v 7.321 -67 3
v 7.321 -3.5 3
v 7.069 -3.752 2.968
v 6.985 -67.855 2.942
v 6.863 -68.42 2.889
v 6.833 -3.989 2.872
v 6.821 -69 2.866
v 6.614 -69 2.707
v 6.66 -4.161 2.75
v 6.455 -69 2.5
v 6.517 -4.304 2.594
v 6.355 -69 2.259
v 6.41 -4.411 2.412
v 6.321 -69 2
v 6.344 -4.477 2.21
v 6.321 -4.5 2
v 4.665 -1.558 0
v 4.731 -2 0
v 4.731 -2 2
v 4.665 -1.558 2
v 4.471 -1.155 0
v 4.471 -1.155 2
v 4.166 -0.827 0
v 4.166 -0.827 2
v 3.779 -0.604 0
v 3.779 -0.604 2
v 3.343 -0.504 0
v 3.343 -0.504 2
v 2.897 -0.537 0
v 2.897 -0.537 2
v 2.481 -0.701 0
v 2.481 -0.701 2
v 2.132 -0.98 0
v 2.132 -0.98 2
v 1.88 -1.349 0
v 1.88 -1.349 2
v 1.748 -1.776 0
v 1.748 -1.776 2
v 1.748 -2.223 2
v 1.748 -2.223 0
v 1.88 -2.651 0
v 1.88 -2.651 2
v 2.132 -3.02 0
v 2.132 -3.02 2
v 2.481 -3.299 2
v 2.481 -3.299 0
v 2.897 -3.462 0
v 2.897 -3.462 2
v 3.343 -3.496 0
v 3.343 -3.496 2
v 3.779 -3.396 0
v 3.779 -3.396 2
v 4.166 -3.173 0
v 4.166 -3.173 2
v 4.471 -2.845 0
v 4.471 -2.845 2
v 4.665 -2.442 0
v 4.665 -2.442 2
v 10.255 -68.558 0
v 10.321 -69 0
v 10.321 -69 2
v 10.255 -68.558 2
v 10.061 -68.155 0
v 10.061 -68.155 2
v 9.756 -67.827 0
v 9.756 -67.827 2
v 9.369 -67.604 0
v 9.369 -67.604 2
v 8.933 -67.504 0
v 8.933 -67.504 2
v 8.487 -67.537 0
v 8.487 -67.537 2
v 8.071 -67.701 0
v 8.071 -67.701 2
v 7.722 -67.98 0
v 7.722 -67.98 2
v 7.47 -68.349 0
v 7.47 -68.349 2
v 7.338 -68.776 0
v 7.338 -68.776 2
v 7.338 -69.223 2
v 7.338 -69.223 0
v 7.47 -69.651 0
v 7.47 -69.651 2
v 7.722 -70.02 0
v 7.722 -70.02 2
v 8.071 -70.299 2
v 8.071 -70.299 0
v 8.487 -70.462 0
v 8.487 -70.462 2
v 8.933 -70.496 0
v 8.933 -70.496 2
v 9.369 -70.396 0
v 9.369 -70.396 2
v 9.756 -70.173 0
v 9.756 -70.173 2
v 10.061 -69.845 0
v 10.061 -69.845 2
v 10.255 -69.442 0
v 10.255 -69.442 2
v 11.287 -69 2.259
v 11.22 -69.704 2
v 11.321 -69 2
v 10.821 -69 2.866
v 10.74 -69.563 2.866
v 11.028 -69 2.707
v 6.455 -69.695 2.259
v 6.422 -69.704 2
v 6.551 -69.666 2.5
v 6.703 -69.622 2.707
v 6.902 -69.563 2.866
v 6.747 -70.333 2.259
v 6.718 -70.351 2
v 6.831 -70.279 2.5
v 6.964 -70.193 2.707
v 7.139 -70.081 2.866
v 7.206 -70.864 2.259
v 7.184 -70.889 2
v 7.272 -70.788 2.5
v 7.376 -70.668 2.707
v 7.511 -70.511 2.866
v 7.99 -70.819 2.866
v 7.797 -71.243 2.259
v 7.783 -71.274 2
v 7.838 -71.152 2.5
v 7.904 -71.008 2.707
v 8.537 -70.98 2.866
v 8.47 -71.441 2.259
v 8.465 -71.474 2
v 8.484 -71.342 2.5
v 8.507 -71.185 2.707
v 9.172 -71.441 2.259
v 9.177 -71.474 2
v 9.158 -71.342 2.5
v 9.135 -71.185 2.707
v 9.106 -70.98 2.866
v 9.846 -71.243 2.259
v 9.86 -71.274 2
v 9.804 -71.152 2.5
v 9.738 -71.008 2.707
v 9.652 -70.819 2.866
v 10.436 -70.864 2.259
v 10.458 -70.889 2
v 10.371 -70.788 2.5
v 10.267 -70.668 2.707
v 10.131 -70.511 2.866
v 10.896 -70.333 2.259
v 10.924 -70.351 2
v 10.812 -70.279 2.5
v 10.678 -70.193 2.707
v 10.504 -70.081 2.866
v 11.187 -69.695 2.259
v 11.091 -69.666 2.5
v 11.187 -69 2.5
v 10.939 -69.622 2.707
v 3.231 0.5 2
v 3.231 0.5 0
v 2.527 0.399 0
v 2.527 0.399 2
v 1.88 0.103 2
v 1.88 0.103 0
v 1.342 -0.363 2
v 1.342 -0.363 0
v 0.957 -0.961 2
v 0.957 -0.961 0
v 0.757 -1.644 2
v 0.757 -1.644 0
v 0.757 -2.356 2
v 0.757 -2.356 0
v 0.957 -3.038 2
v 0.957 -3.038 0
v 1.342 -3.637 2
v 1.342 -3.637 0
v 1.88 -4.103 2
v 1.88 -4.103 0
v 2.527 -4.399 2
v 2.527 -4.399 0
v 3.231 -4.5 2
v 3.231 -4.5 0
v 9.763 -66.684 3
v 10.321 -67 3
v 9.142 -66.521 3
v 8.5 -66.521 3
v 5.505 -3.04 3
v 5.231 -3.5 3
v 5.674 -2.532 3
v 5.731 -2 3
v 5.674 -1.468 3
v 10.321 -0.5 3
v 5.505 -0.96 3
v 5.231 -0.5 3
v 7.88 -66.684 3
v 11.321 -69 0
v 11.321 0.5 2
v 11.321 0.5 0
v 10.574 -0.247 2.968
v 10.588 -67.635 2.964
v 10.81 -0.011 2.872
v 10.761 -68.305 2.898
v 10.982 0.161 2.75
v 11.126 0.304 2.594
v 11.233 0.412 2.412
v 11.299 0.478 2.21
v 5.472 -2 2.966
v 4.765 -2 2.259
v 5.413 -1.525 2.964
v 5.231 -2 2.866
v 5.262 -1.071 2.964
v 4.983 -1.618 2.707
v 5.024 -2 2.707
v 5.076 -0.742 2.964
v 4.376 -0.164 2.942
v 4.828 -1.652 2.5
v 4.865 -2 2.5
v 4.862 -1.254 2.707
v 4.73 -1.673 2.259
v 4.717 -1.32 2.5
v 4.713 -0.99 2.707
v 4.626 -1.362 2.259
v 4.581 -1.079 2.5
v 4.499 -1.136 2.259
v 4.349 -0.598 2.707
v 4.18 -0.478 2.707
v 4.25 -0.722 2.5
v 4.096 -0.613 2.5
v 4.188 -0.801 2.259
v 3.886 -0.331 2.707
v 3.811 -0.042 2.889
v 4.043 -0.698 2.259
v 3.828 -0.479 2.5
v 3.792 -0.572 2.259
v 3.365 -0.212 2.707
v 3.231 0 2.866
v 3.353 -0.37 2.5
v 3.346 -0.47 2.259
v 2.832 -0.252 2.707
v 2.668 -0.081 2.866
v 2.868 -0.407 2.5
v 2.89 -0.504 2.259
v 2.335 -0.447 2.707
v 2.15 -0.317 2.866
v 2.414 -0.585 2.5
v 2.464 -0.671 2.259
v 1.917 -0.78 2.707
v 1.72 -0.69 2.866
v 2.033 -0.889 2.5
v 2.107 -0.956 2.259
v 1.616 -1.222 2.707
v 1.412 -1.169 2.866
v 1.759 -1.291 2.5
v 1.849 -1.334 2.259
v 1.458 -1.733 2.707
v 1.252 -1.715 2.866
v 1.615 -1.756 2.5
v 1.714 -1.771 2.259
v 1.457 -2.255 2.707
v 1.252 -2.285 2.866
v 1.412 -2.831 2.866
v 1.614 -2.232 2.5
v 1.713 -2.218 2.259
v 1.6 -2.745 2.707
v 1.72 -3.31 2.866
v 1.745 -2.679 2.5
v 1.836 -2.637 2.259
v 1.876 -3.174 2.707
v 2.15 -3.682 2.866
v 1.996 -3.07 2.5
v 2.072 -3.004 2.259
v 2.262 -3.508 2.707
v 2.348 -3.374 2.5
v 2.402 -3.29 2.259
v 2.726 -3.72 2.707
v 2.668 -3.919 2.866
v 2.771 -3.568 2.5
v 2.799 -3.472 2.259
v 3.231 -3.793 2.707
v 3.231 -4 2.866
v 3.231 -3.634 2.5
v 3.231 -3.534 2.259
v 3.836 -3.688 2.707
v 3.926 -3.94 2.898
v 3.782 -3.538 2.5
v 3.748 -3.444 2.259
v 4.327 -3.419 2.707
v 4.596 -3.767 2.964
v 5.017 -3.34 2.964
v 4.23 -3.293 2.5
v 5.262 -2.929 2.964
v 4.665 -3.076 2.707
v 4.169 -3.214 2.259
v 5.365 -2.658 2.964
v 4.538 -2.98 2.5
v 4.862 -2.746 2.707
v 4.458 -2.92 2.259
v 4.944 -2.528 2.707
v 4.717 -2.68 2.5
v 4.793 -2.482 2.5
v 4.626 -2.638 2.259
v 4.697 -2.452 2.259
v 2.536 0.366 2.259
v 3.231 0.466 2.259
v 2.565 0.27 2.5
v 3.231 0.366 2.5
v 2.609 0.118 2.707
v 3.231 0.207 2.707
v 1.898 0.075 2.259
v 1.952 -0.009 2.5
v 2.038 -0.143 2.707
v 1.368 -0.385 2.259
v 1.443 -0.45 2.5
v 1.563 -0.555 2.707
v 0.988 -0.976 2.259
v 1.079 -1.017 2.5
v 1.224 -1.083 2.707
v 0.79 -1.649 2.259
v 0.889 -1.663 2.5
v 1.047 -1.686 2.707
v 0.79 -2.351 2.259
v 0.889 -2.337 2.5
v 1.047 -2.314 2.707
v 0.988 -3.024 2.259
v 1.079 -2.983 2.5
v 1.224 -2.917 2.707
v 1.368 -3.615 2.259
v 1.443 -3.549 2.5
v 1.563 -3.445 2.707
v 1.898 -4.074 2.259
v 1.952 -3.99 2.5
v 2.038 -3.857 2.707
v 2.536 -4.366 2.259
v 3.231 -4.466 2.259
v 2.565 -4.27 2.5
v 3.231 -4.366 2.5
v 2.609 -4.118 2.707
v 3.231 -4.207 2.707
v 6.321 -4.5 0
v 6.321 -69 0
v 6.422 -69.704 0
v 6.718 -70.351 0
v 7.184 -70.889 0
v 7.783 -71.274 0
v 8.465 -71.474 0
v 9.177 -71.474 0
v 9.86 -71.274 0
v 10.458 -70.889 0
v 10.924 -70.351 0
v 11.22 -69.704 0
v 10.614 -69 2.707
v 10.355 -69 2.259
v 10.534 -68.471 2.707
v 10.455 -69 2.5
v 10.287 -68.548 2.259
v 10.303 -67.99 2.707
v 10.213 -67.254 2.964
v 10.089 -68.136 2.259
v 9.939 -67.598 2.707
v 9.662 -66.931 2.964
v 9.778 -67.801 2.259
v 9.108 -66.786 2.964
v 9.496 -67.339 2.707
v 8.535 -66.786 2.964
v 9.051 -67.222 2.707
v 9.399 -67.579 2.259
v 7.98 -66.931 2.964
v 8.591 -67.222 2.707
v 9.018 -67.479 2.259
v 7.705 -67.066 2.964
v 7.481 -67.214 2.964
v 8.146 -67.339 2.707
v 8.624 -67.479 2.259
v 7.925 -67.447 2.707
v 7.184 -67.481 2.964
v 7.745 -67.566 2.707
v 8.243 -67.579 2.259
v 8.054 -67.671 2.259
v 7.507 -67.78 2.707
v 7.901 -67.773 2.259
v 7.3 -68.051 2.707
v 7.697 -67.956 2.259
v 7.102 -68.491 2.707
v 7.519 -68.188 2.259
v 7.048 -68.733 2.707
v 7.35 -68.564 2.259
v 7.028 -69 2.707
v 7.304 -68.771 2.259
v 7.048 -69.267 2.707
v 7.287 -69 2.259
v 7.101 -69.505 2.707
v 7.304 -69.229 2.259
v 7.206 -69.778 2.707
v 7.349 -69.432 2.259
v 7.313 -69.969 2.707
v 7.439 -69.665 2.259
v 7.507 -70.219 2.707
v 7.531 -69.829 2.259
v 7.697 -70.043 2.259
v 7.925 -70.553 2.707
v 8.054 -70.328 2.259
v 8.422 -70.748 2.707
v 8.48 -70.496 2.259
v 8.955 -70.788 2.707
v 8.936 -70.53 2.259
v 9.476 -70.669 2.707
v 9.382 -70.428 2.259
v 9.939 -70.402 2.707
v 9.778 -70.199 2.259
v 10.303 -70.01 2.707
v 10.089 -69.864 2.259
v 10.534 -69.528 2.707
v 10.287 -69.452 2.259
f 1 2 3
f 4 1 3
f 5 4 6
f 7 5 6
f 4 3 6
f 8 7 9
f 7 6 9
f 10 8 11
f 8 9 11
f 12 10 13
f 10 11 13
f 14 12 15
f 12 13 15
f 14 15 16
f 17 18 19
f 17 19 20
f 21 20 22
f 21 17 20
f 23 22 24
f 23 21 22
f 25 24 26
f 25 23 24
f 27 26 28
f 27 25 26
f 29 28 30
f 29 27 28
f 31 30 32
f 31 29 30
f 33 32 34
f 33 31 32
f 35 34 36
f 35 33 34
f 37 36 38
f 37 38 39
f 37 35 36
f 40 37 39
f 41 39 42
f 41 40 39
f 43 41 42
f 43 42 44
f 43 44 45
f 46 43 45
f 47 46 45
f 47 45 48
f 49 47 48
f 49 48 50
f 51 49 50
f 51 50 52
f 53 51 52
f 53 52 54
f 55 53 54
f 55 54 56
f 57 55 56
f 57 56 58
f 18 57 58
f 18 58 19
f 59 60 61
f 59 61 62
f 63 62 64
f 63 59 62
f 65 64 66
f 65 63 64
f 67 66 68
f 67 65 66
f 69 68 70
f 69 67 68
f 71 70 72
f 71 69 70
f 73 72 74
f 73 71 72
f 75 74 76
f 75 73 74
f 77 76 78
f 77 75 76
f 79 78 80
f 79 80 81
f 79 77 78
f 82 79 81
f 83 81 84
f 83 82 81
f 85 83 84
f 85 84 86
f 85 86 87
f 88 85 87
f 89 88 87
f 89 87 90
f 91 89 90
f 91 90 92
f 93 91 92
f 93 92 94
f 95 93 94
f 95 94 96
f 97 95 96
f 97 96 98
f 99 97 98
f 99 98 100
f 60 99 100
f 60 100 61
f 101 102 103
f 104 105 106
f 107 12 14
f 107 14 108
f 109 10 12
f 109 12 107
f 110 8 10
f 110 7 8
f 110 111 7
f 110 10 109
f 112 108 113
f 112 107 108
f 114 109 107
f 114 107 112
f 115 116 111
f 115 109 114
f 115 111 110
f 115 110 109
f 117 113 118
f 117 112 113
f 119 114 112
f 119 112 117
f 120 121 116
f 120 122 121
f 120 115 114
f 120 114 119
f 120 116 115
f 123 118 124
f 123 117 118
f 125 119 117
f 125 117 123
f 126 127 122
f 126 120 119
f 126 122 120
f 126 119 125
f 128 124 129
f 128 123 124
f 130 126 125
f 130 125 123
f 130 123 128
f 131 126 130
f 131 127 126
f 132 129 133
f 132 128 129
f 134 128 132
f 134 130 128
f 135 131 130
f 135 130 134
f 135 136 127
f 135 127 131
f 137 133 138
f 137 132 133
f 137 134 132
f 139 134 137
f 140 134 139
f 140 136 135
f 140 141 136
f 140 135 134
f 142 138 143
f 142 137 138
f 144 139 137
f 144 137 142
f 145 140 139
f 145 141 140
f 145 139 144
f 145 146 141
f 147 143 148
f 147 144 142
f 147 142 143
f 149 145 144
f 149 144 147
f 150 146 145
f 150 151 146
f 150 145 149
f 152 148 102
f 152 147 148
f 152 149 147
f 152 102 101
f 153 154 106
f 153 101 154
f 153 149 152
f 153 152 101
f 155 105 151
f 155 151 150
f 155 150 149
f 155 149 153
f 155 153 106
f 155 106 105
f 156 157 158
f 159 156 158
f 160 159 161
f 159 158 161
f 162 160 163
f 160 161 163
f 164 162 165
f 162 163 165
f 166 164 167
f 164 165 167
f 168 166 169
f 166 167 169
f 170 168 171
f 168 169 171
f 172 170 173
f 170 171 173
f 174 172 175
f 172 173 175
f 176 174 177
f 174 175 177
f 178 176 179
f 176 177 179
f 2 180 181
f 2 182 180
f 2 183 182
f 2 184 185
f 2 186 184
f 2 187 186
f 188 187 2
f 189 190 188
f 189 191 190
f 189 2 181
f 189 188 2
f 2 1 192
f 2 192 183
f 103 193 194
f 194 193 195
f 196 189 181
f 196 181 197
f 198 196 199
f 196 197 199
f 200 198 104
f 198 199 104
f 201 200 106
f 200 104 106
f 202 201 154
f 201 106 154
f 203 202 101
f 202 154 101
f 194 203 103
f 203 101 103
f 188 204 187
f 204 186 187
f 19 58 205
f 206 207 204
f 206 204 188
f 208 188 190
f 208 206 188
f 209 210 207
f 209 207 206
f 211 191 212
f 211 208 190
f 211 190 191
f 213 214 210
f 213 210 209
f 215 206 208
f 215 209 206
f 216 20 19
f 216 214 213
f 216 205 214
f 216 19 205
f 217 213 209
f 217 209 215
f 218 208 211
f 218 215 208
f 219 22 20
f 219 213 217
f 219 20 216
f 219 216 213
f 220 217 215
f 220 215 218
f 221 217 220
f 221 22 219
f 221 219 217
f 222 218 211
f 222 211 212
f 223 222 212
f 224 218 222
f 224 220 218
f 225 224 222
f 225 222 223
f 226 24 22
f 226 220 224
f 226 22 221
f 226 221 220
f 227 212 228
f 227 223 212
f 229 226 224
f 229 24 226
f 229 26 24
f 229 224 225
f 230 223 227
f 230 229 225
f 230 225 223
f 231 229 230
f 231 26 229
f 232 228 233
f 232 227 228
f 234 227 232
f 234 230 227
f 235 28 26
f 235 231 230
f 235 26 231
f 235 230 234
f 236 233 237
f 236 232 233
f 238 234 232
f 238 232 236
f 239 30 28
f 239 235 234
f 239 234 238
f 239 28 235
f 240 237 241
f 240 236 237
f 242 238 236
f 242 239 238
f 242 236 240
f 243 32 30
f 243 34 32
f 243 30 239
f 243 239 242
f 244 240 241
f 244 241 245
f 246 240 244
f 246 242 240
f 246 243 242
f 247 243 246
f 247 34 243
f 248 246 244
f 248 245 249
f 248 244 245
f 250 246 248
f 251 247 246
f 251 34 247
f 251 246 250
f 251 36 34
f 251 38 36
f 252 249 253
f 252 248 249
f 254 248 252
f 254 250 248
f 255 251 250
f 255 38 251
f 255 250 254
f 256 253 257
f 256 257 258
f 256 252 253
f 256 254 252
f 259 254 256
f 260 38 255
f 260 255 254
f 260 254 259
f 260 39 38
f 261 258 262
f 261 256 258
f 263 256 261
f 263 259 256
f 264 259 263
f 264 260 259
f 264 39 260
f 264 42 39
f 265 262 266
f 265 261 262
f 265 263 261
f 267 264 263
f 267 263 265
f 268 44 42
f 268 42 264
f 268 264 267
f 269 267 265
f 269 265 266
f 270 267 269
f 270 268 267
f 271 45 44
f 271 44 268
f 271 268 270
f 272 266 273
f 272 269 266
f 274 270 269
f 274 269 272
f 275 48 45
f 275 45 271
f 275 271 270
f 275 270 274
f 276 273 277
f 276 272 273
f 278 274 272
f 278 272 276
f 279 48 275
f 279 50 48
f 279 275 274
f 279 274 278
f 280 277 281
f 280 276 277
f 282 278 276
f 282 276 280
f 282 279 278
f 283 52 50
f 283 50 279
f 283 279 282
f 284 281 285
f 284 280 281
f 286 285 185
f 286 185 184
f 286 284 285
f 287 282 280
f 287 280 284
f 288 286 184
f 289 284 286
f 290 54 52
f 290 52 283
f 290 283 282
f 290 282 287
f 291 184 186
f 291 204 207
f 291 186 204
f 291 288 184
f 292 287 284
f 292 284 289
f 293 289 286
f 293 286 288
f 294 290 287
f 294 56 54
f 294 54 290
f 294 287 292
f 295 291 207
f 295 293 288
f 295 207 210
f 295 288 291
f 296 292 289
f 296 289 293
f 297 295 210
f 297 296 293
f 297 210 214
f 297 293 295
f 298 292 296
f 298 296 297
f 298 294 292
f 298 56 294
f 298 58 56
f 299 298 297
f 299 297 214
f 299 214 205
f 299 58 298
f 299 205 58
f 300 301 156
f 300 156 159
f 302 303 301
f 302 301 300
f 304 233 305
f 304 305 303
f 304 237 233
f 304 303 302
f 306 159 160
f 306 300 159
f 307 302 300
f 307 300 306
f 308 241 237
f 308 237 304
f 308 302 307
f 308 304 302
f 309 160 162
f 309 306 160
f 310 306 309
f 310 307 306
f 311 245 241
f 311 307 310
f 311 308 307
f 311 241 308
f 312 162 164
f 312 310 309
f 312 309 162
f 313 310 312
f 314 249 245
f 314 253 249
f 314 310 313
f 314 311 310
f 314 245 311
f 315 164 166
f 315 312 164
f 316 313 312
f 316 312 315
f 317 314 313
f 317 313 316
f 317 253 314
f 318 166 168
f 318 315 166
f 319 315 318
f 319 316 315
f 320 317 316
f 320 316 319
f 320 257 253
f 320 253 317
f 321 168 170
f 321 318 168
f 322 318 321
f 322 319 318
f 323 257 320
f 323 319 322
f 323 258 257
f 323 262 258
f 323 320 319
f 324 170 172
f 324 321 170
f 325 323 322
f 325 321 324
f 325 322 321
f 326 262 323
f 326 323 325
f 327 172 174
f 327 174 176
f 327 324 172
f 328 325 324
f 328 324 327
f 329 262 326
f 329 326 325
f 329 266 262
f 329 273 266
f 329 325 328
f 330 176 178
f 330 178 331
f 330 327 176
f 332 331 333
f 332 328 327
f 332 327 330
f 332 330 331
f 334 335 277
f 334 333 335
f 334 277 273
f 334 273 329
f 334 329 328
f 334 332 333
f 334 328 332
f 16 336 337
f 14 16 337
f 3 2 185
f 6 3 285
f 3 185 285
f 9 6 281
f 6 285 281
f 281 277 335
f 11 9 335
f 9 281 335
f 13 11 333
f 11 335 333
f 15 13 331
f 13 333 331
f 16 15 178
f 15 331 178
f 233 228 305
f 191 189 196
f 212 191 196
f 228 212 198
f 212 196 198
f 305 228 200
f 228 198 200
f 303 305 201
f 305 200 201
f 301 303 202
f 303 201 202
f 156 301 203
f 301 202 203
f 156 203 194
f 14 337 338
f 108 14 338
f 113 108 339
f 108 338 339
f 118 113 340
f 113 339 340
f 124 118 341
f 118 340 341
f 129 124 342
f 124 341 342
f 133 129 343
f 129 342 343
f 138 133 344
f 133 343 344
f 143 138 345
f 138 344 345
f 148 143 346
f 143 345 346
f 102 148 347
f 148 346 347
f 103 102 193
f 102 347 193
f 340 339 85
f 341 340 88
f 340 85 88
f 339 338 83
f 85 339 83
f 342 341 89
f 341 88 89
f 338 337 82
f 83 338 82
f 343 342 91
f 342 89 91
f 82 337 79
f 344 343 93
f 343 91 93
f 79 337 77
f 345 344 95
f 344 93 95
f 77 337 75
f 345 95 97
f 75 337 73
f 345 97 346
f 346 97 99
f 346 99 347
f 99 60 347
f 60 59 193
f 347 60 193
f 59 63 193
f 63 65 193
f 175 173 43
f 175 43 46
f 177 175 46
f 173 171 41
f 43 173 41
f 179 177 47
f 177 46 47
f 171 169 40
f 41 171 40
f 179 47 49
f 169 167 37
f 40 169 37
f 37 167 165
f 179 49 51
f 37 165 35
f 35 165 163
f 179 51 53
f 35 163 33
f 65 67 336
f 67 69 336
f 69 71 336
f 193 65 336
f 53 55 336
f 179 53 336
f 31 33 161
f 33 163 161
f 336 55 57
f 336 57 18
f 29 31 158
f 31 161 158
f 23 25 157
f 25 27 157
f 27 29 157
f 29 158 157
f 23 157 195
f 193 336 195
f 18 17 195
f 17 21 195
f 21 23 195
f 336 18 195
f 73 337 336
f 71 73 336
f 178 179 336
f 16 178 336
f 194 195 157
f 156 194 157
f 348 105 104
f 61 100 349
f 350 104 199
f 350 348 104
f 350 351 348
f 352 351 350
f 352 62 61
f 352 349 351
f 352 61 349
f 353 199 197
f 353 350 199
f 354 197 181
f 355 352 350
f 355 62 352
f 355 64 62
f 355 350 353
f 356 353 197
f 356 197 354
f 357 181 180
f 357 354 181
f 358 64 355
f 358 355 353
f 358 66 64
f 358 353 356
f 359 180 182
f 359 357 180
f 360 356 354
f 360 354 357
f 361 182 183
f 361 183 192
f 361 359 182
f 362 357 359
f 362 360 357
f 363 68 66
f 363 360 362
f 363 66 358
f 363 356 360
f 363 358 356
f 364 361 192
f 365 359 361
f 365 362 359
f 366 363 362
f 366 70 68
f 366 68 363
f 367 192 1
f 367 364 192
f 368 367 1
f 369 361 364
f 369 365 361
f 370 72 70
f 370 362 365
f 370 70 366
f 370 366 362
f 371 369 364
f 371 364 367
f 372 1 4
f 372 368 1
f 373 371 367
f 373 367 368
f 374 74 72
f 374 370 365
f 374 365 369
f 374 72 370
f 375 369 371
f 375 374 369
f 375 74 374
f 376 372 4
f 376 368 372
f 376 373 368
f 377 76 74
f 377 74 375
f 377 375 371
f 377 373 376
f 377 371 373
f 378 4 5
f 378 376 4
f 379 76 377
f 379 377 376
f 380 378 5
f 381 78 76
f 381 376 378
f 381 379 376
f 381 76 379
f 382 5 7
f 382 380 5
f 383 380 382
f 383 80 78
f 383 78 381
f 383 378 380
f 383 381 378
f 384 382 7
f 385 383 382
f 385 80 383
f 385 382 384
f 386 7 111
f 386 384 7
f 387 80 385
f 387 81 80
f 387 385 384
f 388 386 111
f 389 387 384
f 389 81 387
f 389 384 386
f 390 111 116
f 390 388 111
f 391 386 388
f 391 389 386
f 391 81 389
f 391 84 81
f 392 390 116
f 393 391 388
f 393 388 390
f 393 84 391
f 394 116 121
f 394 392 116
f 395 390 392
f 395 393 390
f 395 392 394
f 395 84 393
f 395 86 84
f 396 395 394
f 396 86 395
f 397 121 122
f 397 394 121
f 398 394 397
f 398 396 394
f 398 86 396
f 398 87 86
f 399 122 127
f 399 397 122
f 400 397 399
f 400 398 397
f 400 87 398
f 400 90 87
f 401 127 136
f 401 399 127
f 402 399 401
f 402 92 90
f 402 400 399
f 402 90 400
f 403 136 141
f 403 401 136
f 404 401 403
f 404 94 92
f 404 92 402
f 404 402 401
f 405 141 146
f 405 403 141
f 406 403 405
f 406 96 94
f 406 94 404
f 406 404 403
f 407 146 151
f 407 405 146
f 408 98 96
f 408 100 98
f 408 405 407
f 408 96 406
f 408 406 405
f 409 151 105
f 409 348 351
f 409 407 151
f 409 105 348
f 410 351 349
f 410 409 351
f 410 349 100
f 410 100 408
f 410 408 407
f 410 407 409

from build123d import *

# Parameters (mm, degrees)
SKETCH1_R           = 1.5
BOSS_EXTRUDE1_DEPTH = 3
FILLET1_R           = 1


with BuildPart() as part:
    # Sketch1 → Boss-Extrude1 (new body)
    with BuildSketch(Plane.XY):
        with BuildLine():
            Line((3.231167374, -4.499889348), (6.321167374, -4.499889348))
            Line((6.321167374, -4.499889348), (6.321167374, -68.999889348))
            ThreePointArc((6.321167374, -68.999889348), (8.821167374, -71.499889348), (11.321167374, -68.999889348))
            Line((11.321167374, -68.999889348), (11.321167374, 0.500110652))
            Line((11.321167374, 0.500110652), (3.231167374, 0.500110652))
            ThreePointArc((3.231167374, 0.500110652), (0.731167374, -1.999889348), (3.231167374, -4.499889348))
        make_face()
        with Locations((3.231167374, -1.999889348)):
            Circle(SKETCH1_R, mode=Mode.SUBTRACT)
        with Locations((8.821167374, -68.999889348)):
            Circle(SKETCH1_R, mode=Mode.SUBTRACT)
    extrude(amount=BOSS_EXTRUDE1_DEPTH)

    # Fillet1
    # the kernel refuses this fillet: 1 mm, written as the material it takes off along each edge
    with BuildSketch(Plane(origin=(8.821167374, -68.999889348, 3), x_dir=(1, 0, 0), z_dir=(0, -1, 0))) as fillet1_piece_1:
        with BuildLine():
            CenterArc((1.5 + FILLET1_R, -FILLET1_R), FILLET1_R, 90, 90)
            Line((1.5 + FILLET1_R, 0), (1.5, 0))
            Line((1.5, 0), (1.5, -FILLET1_R))
        make_face()
    revolve(axis=Axis((8.821167374, -68.999889348, 3), (0, 0, 1)), mode=Mode.SUBTRACT)
    with BuildSketch(Plane(origin=(3.231167374, -1.999889348, 3), x_dir=(1, 0, 0), z_dir=(0, -1, 0))) as fillet1_piece_2:
        with BuildLine():
            CenterArc((1.5 + FILLET1_R, -FILLET1_R), FILLET1_R, 90, 90)
            Line((1.5 + FILLET1_R, 0), (1.5, 0))
            Line((1.5, 0), (1.5, -FILLET1_R))
        make_face()
    revolve(axis=Axis((3.231167374, -1.999889348, 3), (0, 0, 1)), mode=Mode.SUBTRACT)
    with BuildSketch(Plane(origin=(13.821167374, 0.500110652, 3), x_dir=(0, 0, -1), z_dir=(-1, 0, 0))) as fillet1_piece_3:
        with BuildLine():
            CenterArc((FILLET1_R, FILLET1_R), FILLET1_R, 180, 90)
            Line((0, FILLET1_R), (0, 0))
            Line((0, 0), (FILLET1_R, 0))
        make_face()
    extrude(amount=10.59, mode=Mode.SUBTRACT)
    with BuildSketch(Plane(origin=(11.321167374, -68.999889348, 3), x_dir=(0, 0, -1), z_dir=(0, 1, 0))) as fillet1_piece_4:
        with BuildLine():
            CenterArc((FILLET1_R, FILLET1_R), FILLET1_R, 180, 90)
            Line((0, FILLET1_R), (0, 0))
            Line((0, 0), (FILLET1_R, 0))
        make_face()
    extrude(amount=72, mode=Mode.SUBTRACT)
    with BuildSketch(Plane(origin=(8.821167374, -68.999889348, 3), x_dir=(-1, 0, 0), z_dir=(0, 1, 0))) as fillet1_piece_5:
        with BuildLine():
            CenterArc((2.5 - FILLET1_R, -FILLET1_R), FILLET1_R, 0, 90)
            Line((2.5 - FILLET1_R, 0), (2.5, 0))
            Line((2.5, 0), (2.5, -FILLET1_R))
        make_face()
    revolve(axis=Axis((8.821167374, -68.999889348, 3), (0, 0, 1)), revolution_arc=180, mode=Mode.SUBTRACT)
    with BuildSketch(Plane(origin=(6.321167374, -4.499889348, 3), x_dir=(0, 0, -1), z_dir=(0, -1, 0))) as fillet1_piece_6:
        with BuildLine():
            CenterArc((FILLET1_R, FILLET1_R), FILLET1_R, 180, 90)
            Line((0, FILLET1_R), (0, 0))
            Line((0, 0), (FILLET1_R, 0))
        make_face()
    extrude(amount=64.5, mode=Mode.SUBTRACT)
    with BuildSketch(Plane(origin=(3.231167374, -4.499889348, 3), x_dir=(0, 0, -1), z_dir=(1, 0, 0))) as fillet1_piece_7:
        with BuildLine():
            CenterArc((FILLET1_R, FILLET1_R), FILLET1_R, 180, 90)
            Line((0, FILLET1_R), (0, 0))
            Line((0, 0), (FILLET1_R, 0))
        make_face()
    extrude(amount=3.09, mode=Mode.SUBTRACT)
    with BuildSketch(Plane(origin=(3.231167374, -1.999889348, 3), x_dir=(0, 1, 0), z_dir=(1, 0, 0))) as fillet1_piece_8:
        with BuildLine():
            CenterArc((2.5 - FILLET1_R, -FILLET1_R), FILLET1_R, 0, 90)
            Line((2.5 - FILLET1_R, 0), (2.5, 0))
            Line((2.5, 0), (2.5, -FILLET1_R))
        make_face()
    revolve(axis=Axis((3.231167374, -1.999889348, 3), (0, 0, 1)), revolution_arc=180, mode=Mode.SUBTRACT)
    with BuildSketch(Plane(origin=(3.231167374, -4.499889348, 3), x_dir=(0, 0, -1), z_dir=(1, 0, 0))) as fillet1_piece_9a_section:
        with BuildLine():
            CenterArc((FILLET1_R, FILLET1_R), FILLET1_R, 180, 90)
            Line((0, FILLET1_R), (0, 0))
            Line((0, 0), (FILLET1_R, 0))
        make_face()
    fillet1_piece_9a = extrude(amount=5.59, mode=Mode.PRIVATE)
    fillet1_piece_9a = split(fillet1_piece_9a, bisect_by=Plane(origin=(6.321167374, -4.273494233, 2.773604886), z_dir=(1, 0, 0)), keep=Keep.TOP, mode=Mode.PRIVATE)
    with BuildSketch(Plane(origin=(6.321167374, -1.999889348, 3), x_dir=(0, 0, -1), z_dir=(0, -1, 0))) as fillet1_piece_9b_section:
        with BuildLine():
            CenterArc((FILLET1_R, FILLET1_R), FILLET1_R, 180, 90)
            Line((0, FILLET1_R), (0, 0))
            Line((0, 0), (FILLET1_R, 0))
        make_face()
    fillet1_piece_9b = extrude(amount=67, mode=Mode.PRIVATE)
    fillet1_piece_9b = split(fillet1_piece_9b, bisect_by=Plane(origin=(6.547562488, -4.499889348, 2.773604886), z_dir=(0, 1, 0)), keep=Keep.TOP, mode=Mode.PRIVATE)
    fillet1_piece_9 = fillet1_piece_9a & fillet1_piece_9b
    add(fillet1_piece_9, mode=Mode.SUBTRACT)


solid = part.part
